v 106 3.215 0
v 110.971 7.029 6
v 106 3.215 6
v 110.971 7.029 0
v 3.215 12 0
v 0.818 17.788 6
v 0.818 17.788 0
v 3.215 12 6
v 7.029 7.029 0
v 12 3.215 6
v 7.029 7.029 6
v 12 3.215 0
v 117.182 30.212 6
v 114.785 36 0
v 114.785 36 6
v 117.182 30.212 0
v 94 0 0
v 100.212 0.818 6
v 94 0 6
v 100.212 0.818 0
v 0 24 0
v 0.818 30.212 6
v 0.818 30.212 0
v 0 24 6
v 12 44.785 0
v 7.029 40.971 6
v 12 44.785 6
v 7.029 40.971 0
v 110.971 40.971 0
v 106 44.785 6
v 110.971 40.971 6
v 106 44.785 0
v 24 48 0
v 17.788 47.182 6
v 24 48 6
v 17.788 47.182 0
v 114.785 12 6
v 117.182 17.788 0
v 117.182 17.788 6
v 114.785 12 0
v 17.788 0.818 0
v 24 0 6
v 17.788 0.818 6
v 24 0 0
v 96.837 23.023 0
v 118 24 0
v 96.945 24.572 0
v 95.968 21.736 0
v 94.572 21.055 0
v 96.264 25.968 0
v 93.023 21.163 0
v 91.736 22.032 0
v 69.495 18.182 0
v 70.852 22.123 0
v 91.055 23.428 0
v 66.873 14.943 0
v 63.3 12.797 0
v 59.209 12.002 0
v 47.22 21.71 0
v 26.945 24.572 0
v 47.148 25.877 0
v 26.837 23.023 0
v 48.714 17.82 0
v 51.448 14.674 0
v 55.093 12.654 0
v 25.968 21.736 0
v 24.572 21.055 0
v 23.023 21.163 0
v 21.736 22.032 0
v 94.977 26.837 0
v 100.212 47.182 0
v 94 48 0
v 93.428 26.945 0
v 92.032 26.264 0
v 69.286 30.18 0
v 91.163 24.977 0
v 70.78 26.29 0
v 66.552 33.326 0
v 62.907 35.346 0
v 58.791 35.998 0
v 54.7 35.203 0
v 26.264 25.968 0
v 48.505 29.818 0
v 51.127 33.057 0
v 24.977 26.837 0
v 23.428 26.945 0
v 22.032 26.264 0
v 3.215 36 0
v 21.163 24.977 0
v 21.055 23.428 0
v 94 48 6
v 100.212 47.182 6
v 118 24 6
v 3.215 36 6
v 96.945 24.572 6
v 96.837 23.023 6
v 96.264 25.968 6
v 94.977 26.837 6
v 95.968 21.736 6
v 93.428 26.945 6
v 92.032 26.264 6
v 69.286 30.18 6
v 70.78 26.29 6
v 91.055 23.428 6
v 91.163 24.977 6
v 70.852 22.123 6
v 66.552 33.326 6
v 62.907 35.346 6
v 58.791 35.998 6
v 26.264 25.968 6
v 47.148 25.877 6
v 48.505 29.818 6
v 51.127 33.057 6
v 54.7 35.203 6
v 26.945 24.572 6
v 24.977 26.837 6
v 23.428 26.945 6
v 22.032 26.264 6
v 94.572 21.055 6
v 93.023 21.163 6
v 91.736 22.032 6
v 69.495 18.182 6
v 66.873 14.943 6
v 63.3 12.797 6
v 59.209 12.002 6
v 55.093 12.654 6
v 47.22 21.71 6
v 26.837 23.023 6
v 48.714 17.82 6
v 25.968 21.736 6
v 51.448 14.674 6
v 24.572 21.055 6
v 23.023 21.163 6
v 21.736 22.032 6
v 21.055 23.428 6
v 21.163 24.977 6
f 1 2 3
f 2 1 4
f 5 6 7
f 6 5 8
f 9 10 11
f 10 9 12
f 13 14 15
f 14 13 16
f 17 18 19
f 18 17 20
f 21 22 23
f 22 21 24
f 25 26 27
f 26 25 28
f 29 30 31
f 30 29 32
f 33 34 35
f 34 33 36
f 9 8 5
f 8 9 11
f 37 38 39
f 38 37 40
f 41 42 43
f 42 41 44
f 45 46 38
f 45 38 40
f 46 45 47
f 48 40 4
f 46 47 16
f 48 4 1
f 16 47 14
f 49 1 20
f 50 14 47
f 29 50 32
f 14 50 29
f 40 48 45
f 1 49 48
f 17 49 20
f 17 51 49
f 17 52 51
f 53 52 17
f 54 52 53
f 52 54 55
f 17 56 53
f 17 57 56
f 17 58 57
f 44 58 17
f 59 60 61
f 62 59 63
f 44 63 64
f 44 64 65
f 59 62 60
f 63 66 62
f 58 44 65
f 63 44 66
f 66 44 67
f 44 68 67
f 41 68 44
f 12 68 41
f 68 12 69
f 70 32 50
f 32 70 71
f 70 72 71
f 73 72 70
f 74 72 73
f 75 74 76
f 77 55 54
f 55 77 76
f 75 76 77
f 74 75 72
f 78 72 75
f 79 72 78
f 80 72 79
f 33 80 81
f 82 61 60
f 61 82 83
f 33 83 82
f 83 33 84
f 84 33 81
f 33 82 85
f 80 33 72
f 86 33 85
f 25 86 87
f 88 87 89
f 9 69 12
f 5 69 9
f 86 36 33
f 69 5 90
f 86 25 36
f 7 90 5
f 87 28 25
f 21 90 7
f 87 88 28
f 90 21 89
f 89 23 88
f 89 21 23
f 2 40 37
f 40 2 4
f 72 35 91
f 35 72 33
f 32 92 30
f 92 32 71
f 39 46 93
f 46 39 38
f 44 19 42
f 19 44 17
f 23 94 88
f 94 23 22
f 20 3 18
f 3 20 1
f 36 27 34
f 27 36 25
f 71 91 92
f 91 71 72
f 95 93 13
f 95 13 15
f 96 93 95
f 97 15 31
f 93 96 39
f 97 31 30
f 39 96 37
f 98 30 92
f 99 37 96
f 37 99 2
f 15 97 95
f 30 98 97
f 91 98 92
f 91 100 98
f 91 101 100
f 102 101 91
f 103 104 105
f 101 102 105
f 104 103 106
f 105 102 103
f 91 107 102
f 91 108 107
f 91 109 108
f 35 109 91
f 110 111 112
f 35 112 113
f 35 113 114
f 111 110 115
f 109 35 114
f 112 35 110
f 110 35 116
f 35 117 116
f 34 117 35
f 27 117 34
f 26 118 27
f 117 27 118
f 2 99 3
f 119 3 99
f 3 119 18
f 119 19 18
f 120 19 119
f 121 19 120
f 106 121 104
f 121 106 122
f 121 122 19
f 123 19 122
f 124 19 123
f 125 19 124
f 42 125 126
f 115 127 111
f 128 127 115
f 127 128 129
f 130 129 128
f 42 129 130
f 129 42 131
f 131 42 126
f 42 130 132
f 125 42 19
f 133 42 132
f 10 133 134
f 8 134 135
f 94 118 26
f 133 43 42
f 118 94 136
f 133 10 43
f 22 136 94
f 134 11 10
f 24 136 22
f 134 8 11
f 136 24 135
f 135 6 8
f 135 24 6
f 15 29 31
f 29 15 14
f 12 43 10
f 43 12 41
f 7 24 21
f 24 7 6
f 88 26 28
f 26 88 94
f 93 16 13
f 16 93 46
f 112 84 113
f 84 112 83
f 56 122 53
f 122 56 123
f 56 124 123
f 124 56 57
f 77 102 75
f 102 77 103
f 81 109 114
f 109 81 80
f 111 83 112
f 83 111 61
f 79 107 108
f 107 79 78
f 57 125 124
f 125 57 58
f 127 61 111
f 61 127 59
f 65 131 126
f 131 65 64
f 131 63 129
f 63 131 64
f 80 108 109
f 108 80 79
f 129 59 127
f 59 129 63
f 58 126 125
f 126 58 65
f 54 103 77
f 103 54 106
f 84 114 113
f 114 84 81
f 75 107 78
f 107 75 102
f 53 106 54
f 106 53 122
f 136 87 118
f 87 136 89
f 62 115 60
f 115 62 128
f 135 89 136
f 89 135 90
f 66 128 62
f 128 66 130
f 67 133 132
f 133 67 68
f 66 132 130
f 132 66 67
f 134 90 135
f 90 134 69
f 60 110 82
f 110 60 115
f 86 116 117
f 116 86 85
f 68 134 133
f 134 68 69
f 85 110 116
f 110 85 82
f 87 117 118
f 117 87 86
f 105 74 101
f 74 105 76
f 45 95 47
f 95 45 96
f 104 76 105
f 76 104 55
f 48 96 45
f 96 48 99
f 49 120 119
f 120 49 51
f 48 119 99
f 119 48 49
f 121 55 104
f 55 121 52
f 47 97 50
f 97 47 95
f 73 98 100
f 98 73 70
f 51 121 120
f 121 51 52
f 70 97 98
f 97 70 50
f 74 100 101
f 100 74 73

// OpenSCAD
$fn = 32;

// ----------------------------------------------------------------------
// Spacer plate: obround span 70, caps R24
// ----------------------------------------------------------------------

// --- parameters (mm) ---
bore_r = 12;              // centre bore radius
bolt_r = 3;               // bolt hole radius
plate_t = 6;              // plate thickness, Z (extrusion height)
span = 70;                // obround span
cap_r = 24;               // cap radius

profile = [[24, 48], [17.788, 47.182], [12, 44.785], [7.029, 40.971], [3.215, 36], [0.818, 30.212], [0, 24], [0.818, 17.788], [3.215, 12], [7.029, 7.029], [12, 3.215], [17.788, 0.818], [24, 0], [94, 0], [100.212, 0.818], [106, 3.215], [110.971, 7.029], [114.785, 12], [117.182, 17.788], [118, 24], [117.182, 30.212], [114.785, 36], [110.971, 40.971], [106, 44.785], [100.212, 47.182], [94, 48]];  // primary outline, 26 points, counter clockwise
void_1 = [[70.78, 26.29], [69.286, 30.18], [66.552, 33.326], [62.907, 35.346], [58.791, 35.998], [54.7, 35.203], [51.127, 33.057], [48.505, 29.818], [47.148, 25.877], [47.22, 21.71], [48.714, 17.82], [51.448, 14.674], [55.093, 12.654], [59.209, 12.002], [63.3, 12.797], [66.873, 14.943], [69.495, 18.182], [70.852, 22.123]];  // centre bore, 18 points
void_2 = [[26.945, 24.572], [26.264, 25.968], [24.977, 26.837], [23.428, 26.945], [22.032, 26.264], [21.163, 24.977], [21.055, 23.428], [21.736, 22.032], [23.023, 21.163], [24.572, 21.055], [25.968, 21.736], [26.837, 23.023]];  // end hole, 12 points
void_3 = [[96.945, 24.572], [96.264, 25.968], [94.977, 26.837], [93.428, 26.945], [92.032, 26.264], [91.163, 24.977], [91.055, 23.428], [91.736, 22.032], [93.023, 21.163], [94.572, 21.055], [95.968, 21.736], [96.837, 23.023]];  // end hole, 12 points

// --- the one profile operation ---
difference() {
  linear_extrude(height = plate_t) polygon(points = profile);
  translate([0, 0, -1])
    linear_extrude(height = plate_t + 2) polygon(points = void_1);
  translate([0, 0, -1])
    linear_extrude(height = plate_t + 2) polygon(points = void_2);
  translate([0, 0, -1])
    linear_extrude(height = plate_t + 2) polygon(points = void_3);
}
